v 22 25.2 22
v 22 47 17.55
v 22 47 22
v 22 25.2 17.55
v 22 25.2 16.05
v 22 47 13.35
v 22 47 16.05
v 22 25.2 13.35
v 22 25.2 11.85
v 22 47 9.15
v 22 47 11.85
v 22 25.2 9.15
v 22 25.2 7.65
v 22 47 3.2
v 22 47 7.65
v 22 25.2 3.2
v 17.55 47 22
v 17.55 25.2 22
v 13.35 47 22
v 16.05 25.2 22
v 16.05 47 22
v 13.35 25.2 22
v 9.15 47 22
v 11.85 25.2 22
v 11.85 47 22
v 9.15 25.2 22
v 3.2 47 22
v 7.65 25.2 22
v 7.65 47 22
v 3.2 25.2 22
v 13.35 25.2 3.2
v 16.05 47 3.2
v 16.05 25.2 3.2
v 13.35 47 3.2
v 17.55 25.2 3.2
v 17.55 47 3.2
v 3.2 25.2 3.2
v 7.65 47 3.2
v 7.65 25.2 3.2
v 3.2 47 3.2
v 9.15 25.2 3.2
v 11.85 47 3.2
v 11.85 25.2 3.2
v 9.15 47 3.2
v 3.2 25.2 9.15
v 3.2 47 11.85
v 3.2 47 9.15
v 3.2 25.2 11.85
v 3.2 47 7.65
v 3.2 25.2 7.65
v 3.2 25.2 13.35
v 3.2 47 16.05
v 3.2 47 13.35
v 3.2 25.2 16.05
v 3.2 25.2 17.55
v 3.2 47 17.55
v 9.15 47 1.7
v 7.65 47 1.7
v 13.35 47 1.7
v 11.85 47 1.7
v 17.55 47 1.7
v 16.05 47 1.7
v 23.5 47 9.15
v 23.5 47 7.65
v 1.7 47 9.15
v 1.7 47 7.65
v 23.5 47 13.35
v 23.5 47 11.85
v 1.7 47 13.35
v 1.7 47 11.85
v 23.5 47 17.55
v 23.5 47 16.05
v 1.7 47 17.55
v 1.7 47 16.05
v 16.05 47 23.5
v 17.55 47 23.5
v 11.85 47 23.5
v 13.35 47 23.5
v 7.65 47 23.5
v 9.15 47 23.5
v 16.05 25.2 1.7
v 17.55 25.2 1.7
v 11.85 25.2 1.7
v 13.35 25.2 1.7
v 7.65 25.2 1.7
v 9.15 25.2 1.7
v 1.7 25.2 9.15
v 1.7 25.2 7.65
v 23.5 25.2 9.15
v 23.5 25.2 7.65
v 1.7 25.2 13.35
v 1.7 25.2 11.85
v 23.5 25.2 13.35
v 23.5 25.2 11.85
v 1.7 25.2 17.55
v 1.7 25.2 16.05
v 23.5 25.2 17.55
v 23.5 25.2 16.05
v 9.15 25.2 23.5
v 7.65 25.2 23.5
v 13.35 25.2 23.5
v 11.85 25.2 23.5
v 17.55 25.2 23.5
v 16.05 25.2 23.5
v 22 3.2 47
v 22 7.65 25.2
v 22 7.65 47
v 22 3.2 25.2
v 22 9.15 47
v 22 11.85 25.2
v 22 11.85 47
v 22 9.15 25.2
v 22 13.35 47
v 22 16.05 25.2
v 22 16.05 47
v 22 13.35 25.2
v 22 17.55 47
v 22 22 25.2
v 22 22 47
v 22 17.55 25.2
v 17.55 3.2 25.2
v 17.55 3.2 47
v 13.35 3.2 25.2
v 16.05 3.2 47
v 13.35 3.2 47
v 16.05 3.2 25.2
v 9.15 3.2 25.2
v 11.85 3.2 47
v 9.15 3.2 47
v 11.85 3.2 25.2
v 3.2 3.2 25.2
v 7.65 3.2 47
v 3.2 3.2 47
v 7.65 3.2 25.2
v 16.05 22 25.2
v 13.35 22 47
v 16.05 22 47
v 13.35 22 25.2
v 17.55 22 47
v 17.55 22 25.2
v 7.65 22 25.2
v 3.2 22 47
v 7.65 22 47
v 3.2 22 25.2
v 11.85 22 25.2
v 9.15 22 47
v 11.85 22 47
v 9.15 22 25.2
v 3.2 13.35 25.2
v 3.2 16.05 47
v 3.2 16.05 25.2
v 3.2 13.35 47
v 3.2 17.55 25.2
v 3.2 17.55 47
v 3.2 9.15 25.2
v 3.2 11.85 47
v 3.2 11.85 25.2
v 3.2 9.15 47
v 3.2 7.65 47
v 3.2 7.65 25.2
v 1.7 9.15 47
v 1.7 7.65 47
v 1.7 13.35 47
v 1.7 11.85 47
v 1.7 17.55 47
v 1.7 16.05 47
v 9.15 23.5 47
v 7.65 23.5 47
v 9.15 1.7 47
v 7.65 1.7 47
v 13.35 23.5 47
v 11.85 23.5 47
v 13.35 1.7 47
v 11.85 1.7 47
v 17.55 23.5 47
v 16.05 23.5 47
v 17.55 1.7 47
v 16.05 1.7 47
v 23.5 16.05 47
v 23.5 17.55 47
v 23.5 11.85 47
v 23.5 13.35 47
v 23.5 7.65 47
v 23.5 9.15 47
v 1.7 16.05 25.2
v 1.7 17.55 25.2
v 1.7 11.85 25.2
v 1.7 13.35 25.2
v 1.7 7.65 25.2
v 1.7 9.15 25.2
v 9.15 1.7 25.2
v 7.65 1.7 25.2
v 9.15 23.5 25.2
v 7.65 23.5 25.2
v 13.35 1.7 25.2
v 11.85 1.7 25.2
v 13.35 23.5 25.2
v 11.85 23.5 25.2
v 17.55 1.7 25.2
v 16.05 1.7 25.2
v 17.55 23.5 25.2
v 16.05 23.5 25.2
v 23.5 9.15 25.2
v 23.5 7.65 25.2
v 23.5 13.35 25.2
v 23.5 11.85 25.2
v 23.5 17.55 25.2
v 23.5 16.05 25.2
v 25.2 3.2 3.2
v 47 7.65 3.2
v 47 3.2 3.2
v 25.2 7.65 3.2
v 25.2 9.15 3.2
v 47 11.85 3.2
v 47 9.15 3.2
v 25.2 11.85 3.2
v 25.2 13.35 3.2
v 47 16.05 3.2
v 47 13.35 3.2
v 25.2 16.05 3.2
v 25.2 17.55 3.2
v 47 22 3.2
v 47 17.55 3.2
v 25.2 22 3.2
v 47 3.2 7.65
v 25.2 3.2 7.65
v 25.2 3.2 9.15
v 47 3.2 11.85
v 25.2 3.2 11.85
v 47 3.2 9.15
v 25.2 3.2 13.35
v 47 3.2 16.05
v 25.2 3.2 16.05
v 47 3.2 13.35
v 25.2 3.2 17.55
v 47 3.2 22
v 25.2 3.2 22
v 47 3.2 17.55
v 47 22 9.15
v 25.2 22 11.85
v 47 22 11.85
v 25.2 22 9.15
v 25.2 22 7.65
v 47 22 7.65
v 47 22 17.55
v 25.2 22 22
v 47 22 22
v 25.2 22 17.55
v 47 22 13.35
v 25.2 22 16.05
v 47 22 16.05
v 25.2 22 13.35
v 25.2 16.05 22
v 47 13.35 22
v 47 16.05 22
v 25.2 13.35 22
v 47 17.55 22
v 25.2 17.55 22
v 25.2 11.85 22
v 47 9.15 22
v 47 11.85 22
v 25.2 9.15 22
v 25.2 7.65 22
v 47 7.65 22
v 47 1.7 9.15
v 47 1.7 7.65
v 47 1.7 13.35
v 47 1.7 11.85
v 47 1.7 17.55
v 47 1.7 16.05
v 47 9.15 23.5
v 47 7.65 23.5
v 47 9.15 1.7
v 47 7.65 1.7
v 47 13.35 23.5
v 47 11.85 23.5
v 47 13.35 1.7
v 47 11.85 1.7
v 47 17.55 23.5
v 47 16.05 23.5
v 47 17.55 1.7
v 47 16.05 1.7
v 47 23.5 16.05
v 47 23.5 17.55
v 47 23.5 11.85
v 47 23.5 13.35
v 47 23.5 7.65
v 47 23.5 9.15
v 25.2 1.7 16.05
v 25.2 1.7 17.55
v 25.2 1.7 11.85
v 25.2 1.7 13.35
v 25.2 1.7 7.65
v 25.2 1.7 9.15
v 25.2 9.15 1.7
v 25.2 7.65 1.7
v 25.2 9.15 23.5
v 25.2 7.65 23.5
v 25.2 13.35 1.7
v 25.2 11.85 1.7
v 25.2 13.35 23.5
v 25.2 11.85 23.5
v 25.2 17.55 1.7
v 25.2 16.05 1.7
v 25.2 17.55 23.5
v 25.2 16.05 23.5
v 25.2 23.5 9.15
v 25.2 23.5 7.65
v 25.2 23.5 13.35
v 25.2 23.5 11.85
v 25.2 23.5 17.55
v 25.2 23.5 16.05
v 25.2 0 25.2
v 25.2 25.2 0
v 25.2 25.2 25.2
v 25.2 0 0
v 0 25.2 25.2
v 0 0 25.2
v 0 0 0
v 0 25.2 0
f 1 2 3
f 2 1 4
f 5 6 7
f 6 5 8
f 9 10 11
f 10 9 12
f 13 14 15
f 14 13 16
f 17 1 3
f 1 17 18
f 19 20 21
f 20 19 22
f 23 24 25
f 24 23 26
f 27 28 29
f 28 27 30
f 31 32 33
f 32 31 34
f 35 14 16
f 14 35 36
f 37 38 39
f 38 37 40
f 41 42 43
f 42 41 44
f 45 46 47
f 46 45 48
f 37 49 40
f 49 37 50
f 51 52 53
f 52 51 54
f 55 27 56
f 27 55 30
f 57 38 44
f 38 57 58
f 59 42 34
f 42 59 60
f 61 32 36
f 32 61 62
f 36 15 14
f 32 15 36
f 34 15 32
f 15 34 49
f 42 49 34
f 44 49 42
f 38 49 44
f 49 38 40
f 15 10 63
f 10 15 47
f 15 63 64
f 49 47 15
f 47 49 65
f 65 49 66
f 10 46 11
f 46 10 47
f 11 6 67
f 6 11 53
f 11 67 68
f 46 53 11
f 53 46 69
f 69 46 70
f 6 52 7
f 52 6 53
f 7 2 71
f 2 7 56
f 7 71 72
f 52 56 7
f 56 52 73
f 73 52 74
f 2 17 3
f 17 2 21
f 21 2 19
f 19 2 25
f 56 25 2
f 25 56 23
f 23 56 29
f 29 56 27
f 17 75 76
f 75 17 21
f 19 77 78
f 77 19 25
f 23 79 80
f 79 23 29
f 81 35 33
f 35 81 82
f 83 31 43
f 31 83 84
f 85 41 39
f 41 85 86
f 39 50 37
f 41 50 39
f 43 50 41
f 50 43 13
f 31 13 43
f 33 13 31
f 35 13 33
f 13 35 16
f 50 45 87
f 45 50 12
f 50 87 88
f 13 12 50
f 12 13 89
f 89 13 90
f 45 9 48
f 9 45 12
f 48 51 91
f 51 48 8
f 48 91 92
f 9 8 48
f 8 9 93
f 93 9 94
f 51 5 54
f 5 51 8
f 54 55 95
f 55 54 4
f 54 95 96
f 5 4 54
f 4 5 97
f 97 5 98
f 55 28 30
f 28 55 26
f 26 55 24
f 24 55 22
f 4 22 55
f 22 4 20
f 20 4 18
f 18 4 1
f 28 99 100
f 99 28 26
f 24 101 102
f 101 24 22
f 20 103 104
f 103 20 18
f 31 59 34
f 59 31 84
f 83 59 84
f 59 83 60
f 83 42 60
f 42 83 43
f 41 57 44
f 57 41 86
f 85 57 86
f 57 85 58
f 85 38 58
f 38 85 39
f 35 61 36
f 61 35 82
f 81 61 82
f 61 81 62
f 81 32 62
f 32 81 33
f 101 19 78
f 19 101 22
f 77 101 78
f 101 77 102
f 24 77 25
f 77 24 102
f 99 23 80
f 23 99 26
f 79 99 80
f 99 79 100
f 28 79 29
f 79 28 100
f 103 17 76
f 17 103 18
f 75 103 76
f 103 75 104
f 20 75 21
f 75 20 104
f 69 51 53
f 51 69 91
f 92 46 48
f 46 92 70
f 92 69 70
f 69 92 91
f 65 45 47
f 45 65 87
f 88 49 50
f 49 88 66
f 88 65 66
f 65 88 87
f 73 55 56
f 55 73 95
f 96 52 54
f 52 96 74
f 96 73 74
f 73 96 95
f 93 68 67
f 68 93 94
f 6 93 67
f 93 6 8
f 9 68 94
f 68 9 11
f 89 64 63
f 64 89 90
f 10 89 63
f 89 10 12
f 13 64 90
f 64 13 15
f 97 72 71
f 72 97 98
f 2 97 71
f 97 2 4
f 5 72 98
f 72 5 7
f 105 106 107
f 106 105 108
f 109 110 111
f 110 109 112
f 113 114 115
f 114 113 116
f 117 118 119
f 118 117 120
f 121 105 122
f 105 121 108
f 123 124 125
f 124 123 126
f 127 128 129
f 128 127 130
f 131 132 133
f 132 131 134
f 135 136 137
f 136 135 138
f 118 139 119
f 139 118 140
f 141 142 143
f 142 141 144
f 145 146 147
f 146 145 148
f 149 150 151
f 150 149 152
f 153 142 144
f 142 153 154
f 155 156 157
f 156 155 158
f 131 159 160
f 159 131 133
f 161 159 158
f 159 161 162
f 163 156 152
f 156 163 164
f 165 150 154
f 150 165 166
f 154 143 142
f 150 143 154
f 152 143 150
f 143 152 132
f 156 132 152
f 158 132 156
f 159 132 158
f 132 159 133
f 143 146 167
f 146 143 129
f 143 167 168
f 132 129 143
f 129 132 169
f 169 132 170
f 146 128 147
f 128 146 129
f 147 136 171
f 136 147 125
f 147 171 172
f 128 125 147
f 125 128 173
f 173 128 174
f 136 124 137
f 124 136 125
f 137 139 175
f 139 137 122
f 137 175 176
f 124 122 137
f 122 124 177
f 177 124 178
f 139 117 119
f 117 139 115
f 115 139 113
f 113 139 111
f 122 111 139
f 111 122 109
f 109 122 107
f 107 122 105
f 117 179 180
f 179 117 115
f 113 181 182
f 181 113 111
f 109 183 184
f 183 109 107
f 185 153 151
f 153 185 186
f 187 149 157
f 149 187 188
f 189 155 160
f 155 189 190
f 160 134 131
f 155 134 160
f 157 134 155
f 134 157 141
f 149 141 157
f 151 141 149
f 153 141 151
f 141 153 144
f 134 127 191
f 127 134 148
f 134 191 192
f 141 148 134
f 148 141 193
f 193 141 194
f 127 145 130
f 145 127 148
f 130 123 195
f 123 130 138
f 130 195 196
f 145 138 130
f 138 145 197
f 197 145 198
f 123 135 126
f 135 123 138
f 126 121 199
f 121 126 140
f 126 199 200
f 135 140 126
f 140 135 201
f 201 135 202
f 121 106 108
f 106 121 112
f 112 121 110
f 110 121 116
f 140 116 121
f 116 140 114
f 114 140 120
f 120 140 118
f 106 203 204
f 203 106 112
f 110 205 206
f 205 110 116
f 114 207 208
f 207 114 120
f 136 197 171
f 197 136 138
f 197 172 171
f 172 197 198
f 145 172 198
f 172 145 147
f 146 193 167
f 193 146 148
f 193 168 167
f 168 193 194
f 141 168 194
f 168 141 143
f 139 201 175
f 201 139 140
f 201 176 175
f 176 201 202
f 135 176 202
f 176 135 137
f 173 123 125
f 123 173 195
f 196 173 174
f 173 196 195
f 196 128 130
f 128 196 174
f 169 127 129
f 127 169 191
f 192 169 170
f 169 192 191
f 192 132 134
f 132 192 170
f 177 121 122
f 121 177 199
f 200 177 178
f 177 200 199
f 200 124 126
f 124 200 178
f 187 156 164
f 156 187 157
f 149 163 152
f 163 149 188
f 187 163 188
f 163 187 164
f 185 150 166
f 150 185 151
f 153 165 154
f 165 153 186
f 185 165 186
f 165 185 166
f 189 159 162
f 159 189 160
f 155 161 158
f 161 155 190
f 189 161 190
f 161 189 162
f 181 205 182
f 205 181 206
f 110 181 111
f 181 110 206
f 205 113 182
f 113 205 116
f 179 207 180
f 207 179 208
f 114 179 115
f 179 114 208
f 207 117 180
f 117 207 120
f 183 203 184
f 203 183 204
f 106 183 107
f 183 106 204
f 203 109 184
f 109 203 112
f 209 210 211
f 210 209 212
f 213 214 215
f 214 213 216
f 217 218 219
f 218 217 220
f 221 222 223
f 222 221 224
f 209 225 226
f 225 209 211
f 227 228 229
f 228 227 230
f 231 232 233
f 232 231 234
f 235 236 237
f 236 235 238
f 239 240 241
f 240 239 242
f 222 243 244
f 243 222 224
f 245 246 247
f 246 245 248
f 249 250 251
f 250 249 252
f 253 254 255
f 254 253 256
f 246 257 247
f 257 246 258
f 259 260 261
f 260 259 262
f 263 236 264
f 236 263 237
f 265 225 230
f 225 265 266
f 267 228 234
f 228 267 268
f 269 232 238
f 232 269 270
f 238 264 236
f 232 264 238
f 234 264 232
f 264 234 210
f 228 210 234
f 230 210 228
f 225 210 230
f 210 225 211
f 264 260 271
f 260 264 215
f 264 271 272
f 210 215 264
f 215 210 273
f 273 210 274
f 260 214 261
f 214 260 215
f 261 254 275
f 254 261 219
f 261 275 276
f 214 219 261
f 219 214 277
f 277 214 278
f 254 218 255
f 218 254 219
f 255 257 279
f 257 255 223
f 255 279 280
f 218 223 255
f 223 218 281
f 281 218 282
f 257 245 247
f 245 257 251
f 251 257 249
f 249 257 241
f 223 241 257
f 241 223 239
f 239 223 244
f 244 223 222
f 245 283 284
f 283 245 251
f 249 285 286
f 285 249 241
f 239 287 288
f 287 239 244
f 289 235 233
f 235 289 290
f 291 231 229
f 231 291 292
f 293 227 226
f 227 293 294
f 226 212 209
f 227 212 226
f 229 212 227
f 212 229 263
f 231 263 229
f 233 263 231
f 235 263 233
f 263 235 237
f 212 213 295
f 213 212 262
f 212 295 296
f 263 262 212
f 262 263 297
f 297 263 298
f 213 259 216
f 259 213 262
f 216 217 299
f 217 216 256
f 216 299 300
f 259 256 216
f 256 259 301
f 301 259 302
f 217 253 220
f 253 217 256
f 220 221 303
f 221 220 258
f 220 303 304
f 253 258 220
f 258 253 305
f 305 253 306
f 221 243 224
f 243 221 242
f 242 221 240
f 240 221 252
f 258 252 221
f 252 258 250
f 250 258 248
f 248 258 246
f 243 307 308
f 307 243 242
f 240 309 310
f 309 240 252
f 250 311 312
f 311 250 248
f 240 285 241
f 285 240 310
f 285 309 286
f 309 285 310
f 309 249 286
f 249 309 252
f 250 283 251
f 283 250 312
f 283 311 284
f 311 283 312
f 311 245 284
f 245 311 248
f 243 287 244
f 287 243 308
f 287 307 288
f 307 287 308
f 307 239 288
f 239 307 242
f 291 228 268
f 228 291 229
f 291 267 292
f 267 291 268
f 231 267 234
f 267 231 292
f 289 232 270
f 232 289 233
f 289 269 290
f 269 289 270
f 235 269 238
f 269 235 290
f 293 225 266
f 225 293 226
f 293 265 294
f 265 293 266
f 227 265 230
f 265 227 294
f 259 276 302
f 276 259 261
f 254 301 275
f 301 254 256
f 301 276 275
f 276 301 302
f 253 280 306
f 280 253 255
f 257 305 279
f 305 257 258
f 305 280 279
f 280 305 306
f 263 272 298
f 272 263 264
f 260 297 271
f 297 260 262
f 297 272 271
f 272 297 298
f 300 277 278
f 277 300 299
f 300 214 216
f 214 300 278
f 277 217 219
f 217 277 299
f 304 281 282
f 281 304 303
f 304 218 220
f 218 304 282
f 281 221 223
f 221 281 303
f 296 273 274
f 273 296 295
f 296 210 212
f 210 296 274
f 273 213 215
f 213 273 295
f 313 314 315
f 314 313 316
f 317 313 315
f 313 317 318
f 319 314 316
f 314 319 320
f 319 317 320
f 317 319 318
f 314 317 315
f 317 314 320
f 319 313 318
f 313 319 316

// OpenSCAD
// Size of the cube
osize=25.2;
// Size of the fingers
isize=21.8;
// Vein size
vsize=1.5;

offset=(osize-isize)/2;

union() {
 cube([osize,osize,osize]);
 translate([0,osize,0]) { finger(); }
 translate([0,osize,osize]) { rotate([90,0,0])  finger(); }
 translate([osize,osize,osize]) { rotate([90,90,0])  finger(); }
};

// Sizing test
//rotate([90,0,0]) scale([1,0.3,1]) finger();

module finger() {
 translate([vsize+offset,0,vsize+offset]) cube([isize-(2*vsize),isize,isize-(2*vsize)]);
 // bottom
 translate([(osize/2)-(vsize/2),0,offset]) cube([vsize,isize,vsize]);
 translate([(osize/3)-(vsize/2),0,offset]) cube([vsize,isize,vsize]);
 translate([((osize/3)*2)-(vsize/2),0,offset]) cube([vsize,isize,vsize]);
 // top
 translate([(osize/2)-(vsize/2),0,offset+isize-vsize]) cube([vsize,isize,vsize]);
 translate([(osize/3)-(vsize/2),0,offset+isize-vsize]) cube([vsize,isize,vsize]);
 translate([((osize/3)*2)-(vsize/2),0,offset+isize-vsize]) cube([vsize,isize,vsize]);
 // left
 translate([offset,0,(osize/2)-(vsize/2)]) cube([vsize,isize,vsize]);
 translate([offset,0,(osize/3)-(vsize/2)]) cube([vsize,isize,vsize]);
 translate([offset,0,((osize/3)*2)-(vsize/2)]) cube([vsize,isize,vsize]);
 // right
 translate([offset+isize-vsize,0,(osize/2)-(vsize/2)]) cube([vsize,isize,vsize]);
 translate([offset+isize-vsize,0,(osize/3)-(vsize/2)]) cube([vsize,isize,vsize]);
 translate([offset+isize-vsize,0,((osize/3)*2)-(vsize/2)]) cube([vsize,isize,vsize]);
}
